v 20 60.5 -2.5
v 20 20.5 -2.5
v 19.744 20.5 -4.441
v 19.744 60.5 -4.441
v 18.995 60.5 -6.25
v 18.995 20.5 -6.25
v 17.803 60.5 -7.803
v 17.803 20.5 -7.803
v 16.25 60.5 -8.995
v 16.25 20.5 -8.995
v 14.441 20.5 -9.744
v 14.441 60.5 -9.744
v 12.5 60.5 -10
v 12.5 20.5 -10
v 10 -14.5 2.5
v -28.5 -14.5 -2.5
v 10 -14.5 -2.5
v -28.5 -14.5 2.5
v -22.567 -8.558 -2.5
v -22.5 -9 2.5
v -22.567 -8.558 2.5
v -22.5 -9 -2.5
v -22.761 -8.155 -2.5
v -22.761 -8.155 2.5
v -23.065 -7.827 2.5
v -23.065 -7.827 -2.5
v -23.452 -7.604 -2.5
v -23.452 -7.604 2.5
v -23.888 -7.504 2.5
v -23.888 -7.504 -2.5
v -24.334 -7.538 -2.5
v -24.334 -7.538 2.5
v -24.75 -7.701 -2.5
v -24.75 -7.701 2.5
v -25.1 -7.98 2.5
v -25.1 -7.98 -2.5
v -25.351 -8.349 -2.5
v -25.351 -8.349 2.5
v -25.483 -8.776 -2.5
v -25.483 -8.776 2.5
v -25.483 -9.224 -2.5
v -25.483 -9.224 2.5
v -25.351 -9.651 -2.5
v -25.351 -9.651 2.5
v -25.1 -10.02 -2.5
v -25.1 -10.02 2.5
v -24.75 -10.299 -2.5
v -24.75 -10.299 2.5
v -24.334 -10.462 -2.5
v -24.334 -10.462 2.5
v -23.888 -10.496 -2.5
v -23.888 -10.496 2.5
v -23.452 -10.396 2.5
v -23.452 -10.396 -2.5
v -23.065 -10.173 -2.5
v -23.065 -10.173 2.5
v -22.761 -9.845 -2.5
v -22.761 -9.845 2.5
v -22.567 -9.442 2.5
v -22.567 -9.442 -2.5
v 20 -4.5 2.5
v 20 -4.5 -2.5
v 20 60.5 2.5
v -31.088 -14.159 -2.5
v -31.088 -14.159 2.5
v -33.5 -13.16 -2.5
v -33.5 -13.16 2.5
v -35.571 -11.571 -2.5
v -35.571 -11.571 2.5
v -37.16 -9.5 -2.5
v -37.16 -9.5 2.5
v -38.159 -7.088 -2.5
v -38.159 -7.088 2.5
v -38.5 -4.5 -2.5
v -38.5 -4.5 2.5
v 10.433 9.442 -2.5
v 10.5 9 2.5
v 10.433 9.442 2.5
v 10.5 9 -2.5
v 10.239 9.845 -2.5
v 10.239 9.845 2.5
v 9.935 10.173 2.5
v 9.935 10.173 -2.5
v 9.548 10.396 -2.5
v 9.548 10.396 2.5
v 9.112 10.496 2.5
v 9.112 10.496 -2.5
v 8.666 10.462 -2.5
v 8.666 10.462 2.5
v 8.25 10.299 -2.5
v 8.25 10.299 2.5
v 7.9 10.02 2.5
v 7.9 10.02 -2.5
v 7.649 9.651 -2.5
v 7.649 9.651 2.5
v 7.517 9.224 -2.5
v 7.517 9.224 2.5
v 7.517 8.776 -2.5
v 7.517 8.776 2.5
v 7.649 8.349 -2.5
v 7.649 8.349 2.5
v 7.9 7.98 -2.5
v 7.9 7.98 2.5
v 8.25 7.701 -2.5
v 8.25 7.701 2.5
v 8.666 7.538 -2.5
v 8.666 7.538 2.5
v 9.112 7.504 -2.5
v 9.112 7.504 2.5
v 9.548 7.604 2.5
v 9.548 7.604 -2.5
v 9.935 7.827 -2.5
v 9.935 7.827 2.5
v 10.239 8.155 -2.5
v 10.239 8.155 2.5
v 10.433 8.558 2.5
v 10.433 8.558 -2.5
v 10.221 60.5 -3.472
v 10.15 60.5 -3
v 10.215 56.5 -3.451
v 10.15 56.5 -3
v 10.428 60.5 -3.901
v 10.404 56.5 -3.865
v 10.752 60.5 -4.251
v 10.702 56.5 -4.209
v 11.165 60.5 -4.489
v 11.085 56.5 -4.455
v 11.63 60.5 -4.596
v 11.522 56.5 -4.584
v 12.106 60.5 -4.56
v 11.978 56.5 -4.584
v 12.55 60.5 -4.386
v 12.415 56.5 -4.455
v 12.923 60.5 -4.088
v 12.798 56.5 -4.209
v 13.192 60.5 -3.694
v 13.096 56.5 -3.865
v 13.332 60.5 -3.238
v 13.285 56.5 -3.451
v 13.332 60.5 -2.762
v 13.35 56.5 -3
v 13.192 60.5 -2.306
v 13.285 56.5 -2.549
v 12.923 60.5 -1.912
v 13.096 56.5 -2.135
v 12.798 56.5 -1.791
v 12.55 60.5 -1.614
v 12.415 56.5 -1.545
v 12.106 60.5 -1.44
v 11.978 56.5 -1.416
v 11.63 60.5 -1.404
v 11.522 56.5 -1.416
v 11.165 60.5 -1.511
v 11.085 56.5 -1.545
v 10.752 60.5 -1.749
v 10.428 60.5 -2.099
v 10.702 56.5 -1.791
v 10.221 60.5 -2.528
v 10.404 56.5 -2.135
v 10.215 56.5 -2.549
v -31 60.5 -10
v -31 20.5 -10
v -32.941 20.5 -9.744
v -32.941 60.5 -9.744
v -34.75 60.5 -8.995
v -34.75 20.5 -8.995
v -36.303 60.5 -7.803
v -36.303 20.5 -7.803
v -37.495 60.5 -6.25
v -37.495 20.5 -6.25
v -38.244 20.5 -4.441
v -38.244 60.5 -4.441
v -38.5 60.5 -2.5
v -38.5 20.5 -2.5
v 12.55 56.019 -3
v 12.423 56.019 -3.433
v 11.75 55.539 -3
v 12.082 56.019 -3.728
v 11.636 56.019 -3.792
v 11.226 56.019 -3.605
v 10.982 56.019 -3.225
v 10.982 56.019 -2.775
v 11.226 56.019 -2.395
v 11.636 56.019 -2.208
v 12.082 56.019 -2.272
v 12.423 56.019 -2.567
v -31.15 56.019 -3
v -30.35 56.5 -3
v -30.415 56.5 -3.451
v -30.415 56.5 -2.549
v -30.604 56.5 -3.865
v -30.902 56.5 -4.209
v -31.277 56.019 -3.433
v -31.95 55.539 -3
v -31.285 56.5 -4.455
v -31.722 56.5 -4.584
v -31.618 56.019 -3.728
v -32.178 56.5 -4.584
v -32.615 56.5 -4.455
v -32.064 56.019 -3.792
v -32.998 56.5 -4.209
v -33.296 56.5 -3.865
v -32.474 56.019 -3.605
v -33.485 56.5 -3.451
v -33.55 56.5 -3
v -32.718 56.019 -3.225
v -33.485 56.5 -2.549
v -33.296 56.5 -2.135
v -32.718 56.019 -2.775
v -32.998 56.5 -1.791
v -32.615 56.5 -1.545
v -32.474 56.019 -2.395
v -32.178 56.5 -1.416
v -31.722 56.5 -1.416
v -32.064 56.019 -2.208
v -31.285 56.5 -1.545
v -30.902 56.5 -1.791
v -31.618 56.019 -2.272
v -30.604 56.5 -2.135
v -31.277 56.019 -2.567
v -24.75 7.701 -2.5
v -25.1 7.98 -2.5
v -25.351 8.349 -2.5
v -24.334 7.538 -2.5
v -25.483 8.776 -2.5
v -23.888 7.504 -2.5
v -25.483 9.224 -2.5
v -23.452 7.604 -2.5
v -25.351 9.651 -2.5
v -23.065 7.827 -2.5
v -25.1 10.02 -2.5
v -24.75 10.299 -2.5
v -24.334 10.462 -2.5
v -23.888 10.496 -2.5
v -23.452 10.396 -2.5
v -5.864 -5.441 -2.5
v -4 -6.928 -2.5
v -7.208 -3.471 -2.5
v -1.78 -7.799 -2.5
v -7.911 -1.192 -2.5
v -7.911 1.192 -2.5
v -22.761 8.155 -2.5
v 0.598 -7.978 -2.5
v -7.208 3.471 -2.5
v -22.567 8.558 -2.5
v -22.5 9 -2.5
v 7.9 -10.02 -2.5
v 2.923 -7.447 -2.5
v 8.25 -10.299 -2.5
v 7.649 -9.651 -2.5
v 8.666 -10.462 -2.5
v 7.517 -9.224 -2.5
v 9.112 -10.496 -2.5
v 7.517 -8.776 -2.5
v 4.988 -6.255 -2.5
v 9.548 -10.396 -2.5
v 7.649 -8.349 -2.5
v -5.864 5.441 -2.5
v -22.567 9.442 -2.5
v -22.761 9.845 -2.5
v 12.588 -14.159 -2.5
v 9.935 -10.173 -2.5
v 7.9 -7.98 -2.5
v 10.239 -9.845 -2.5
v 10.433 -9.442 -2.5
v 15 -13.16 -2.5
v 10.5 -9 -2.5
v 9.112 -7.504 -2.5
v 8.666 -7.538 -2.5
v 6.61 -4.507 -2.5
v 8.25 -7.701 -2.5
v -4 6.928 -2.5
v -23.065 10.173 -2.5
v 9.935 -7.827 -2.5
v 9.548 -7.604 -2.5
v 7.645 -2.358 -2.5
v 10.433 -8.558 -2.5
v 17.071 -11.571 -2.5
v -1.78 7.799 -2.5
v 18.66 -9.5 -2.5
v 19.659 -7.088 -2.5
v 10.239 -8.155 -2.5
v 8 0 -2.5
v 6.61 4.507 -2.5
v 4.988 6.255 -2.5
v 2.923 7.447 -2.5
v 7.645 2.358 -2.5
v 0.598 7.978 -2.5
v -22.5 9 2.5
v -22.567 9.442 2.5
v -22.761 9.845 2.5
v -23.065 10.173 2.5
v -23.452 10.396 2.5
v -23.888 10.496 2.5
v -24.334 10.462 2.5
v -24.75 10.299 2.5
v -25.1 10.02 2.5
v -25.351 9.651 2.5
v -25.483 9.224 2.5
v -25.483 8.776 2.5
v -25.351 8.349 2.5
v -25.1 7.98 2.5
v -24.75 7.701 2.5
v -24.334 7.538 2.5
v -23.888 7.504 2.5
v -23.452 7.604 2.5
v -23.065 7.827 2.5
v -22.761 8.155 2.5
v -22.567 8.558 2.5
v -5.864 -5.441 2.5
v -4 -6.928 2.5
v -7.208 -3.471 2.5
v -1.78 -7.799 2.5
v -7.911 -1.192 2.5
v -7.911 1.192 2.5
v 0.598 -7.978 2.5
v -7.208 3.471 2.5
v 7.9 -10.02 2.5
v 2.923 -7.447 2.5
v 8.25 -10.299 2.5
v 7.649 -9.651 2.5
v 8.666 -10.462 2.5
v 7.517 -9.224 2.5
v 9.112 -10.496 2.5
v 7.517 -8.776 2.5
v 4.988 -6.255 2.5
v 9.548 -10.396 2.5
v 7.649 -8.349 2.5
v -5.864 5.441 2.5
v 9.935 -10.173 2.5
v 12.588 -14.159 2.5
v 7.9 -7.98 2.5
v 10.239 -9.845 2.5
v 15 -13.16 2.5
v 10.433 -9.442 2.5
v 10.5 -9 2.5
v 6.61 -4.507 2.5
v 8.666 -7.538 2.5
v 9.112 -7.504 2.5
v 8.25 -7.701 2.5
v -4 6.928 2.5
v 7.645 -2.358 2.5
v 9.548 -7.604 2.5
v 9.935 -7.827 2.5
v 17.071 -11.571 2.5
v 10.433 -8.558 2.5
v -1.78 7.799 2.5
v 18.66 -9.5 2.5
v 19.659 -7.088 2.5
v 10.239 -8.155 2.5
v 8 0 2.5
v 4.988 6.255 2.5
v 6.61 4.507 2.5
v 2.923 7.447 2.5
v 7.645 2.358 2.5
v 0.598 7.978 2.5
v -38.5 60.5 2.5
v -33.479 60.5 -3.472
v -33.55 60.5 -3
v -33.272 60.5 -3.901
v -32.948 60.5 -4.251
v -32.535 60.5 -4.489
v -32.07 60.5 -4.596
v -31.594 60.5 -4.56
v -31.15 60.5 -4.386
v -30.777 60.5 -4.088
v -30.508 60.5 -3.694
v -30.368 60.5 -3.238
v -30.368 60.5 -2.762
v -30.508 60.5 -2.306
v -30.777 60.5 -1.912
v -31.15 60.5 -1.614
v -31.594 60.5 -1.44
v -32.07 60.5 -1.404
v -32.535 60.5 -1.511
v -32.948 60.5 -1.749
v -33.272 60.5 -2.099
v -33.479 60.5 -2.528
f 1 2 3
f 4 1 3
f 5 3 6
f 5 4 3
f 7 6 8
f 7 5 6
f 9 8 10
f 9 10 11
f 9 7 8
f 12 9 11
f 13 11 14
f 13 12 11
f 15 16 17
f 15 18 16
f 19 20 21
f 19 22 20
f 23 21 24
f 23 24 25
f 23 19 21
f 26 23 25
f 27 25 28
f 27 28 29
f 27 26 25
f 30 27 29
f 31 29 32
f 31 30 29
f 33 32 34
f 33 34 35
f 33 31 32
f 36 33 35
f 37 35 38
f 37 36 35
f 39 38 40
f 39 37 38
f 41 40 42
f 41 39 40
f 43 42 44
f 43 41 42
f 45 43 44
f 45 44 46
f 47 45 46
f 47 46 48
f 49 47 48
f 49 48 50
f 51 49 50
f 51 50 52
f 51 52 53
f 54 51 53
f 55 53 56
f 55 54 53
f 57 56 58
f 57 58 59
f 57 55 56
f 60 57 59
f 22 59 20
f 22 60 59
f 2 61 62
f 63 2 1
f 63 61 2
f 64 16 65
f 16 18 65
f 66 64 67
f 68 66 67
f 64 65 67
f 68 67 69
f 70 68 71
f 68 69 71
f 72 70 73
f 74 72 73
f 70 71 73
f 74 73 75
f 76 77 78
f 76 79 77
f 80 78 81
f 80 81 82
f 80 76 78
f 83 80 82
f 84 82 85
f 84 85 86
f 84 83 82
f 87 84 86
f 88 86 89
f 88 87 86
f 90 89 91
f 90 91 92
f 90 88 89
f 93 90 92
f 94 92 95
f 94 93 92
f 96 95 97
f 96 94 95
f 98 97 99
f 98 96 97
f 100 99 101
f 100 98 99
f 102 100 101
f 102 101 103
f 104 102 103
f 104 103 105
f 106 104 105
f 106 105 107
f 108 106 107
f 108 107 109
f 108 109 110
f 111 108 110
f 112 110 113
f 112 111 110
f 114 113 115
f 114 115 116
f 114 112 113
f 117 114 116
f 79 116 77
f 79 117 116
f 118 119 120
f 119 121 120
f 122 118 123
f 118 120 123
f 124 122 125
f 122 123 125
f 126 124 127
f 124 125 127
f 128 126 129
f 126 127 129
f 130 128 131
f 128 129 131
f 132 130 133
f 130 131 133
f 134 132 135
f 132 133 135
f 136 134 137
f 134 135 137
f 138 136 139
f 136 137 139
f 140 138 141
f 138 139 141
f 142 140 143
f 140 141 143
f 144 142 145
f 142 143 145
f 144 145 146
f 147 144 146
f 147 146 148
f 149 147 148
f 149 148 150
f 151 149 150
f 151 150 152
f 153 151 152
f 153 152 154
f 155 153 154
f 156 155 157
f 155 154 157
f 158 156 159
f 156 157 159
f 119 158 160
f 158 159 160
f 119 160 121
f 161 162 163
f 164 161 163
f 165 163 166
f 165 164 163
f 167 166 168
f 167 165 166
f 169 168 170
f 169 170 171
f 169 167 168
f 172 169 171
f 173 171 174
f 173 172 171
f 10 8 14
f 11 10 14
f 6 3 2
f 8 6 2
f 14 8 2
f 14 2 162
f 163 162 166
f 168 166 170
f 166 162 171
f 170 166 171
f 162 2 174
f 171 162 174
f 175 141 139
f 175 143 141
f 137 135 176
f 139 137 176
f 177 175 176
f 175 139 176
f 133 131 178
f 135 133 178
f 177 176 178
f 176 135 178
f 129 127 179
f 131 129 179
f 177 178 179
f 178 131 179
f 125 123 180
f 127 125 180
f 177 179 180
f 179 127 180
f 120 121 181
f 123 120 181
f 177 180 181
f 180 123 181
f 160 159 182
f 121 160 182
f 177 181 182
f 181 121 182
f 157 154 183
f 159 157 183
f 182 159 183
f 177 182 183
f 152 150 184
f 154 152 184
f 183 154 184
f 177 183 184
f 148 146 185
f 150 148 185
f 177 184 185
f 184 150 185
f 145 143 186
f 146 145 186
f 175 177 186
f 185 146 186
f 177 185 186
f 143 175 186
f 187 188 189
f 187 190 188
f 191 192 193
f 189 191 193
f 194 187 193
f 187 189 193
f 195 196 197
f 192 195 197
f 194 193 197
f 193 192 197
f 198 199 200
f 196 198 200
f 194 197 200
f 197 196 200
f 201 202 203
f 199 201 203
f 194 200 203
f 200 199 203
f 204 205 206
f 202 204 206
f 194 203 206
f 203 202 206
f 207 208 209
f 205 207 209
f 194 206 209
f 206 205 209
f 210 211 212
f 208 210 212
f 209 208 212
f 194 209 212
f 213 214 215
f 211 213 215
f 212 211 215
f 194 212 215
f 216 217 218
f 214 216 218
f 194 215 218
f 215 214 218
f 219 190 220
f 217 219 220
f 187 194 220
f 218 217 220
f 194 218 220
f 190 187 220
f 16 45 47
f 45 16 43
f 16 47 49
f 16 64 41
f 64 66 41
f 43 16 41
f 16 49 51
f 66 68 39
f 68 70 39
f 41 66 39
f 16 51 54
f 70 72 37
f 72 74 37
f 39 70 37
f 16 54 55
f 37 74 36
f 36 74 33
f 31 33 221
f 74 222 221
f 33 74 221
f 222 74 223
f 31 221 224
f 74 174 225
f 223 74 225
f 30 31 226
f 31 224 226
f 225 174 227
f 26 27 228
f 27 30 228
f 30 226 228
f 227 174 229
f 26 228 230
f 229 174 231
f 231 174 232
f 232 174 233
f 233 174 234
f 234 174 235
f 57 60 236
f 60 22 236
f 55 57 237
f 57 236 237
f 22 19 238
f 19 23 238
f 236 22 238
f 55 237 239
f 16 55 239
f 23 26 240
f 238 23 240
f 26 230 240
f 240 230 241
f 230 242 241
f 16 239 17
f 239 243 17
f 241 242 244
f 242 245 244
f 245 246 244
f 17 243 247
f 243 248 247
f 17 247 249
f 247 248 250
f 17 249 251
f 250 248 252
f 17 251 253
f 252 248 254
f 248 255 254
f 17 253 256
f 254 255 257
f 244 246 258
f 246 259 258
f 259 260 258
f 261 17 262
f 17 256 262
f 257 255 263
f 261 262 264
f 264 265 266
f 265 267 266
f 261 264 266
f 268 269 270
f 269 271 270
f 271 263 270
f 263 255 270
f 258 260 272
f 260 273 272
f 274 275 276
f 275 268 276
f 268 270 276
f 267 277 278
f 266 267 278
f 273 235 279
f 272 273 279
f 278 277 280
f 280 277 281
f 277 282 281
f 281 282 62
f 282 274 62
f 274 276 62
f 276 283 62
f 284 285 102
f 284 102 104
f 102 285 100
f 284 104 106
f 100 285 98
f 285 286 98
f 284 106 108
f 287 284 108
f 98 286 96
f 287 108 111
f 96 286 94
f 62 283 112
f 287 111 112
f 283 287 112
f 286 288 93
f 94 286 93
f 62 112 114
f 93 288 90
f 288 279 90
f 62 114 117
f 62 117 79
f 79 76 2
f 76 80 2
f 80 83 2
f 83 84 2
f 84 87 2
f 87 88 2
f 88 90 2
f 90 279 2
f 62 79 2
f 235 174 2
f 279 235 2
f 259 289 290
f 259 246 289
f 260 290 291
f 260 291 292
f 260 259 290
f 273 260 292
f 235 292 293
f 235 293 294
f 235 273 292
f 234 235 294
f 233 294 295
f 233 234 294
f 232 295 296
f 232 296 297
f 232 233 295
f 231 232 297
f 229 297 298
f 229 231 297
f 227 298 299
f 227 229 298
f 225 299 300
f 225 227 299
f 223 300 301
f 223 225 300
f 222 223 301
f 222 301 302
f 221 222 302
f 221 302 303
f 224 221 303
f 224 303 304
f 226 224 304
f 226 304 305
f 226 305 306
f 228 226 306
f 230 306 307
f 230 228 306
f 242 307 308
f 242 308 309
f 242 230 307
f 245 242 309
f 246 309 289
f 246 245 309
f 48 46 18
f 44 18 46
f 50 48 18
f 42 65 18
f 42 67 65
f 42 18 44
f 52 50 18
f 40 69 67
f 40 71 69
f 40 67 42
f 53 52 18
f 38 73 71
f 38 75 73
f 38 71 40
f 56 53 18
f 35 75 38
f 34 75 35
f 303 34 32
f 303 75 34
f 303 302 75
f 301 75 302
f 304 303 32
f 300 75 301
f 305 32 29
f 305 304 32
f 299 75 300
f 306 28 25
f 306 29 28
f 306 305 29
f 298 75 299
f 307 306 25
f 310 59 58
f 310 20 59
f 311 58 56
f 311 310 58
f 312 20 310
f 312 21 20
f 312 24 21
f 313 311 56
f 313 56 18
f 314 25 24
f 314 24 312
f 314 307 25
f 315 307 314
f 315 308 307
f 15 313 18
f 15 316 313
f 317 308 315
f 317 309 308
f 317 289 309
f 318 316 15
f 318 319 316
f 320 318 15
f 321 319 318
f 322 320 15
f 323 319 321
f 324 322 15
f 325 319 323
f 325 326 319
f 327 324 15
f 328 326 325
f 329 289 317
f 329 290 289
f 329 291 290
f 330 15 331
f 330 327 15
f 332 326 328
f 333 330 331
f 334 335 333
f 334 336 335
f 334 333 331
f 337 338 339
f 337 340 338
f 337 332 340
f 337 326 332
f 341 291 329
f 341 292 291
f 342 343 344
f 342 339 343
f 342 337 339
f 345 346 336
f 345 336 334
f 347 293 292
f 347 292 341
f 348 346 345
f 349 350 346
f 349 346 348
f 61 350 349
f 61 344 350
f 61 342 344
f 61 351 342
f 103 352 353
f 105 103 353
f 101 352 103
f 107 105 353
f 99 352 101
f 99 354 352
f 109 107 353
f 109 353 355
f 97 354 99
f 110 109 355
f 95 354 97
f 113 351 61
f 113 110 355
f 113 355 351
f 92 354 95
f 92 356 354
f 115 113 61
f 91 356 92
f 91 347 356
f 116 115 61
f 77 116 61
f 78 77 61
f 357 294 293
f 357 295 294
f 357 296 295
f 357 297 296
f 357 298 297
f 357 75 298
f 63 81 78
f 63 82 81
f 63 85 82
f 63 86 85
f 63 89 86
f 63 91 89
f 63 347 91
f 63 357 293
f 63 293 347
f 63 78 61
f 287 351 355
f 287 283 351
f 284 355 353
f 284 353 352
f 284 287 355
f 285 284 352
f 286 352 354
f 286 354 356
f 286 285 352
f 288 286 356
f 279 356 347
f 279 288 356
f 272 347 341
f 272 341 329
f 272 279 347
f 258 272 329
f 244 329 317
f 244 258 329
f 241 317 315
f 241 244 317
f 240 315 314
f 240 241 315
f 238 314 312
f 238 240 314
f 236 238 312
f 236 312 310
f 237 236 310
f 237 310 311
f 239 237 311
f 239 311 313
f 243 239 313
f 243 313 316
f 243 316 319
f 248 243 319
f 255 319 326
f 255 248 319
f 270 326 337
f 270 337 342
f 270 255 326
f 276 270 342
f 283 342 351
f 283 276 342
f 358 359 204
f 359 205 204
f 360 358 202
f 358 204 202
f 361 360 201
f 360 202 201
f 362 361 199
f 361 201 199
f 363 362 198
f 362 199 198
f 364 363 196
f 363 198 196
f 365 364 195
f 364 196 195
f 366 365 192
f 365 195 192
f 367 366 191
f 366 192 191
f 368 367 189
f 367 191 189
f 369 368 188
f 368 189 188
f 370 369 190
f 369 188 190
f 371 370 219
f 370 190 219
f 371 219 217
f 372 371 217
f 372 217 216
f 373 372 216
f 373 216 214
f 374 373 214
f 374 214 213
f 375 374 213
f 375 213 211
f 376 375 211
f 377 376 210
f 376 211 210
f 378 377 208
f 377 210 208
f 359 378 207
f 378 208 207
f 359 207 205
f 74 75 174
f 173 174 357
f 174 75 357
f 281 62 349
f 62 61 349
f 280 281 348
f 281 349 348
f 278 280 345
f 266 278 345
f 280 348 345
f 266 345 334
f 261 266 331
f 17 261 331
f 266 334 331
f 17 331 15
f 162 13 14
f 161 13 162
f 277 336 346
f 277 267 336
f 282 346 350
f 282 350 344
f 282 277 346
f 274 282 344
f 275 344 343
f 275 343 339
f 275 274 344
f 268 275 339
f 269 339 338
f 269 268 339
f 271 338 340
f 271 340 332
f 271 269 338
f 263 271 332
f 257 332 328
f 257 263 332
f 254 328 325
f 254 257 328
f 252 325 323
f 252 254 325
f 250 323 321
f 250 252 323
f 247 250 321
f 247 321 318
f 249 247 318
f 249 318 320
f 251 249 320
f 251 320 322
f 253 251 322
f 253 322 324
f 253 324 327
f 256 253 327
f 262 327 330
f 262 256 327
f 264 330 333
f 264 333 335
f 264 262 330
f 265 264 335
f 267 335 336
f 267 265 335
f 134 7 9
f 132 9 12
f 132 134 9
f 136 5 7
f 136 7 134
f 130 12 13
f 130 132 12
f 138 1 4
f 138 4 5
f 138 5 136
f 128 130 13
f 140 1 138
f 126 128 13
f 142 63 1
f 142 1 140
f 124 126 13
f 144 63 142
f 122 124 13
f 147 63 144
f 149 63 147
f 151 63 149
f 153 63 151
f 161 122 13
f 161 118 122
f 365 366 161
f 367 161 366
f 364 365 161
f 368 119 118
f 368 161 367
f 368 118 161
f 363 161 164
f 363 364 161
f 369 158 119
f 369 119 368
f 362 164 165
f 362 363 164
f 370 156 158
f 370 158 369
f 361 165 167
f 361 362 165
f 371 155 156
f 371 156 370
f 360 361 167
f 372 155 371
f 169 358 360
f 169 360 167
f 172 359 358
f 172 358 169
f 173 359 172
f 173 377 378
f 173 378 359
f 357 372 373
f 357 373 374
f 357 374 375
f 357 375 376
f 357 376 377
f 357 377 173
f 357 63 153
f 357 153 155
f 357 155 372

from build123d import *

# Parameters (mm, degrees)
SKETCH1_W                = 58.5
SKETCH1_H                = 75
SKETCH1_R                = 8
SKETCH1_R_2              = 1.5
BOSS_EXTRUDE1_DEPTH      = 2.5
SKETCH4_W                = 58.5
SKETCH4_H                = 40
BOSS_EXTRUDE2_DEPTH      = 7.5
M3_CLEARANCE_HOLE1_D     = 3.2
M3_CLEARANCE_HOLE1_DEPTH = 4
M3_CLEARANCE_HOLE1_TIP   = 0.96137699
FILLET1_R                = 10
FILLET2_R                = 7.5


with BuildPart() as part:
    # Sketch1 → Boss-Extrude1 (new, symmetric)
    with BuildSketch(Plane.XY):
        with Locations((-9.25, 23)):
            Rectangle(SKETCH1_W, SKETCH1_H)
        Circle(SKETCH1_R, mode=Mode.SUBTRACT)
        with Locations((-24, -9)):
            Circle(SKETCH1_R_2, mode=Mode.SUBTRACT)
        with Locations((9, -9)):
            Circle(SKETCH1_R_2, mode=Mode.SUBTRACT)
        with Locations((9, 9)):
            Circle(SKETCH1_R_2, mode=Mode.SUBTRACT)
        with Locations((-24, 9)):
            Circle(SKETCH1_R_2, mode=Mode.SUBTRACT)
    extrude(amount=BOSS_EXTRUDE1_DEPTH, both=True)

    # Sketch4 → Boss-Extrude2 (add)
    with BuildSketch(Plane(origin=(0, 0, -2.5), x_dir=(-1, 0, 0), z_dir=(0, 0, -1))):
        with Locations((9.25, 40.5)):
            Rectangle(SKETCH4_W, SKETCH4_H)
    extrude(amount=BOSS_EXTRUDE2_DEPTH)

    # M3 Clearance Hole1
    with Locations(Plane(origin=(0, 60.5, 0), x_dir=(1, 0, 0), z_dir=(0, 1, 0))):
        with Locations((-31.95, 3), (11.75, 3)):
            Hole(M3_CLEARANCE_HOLE1_D / 2, depth=M3_CLEARANCE_HOLE1_DEPTH)
            with Locations((0, 0, -(M3_CLEARANCE_HOLE1_DEPTH + M3_CLEARANCE_HOLE1_TIP / 2))):  # 118° drill point
                Cone(0, M3_CLEARANCE_HOLE1_D / 2, M3_CLEARANCE_HOLE1_TIP, mode=Mode.SUBTRACT)

    # Fillet1
    fillet1_edges = [part.edges().sort_by_distance(p)[0] for p in [
        (20, -14.5, 0),
        (-38.5, -14.5, 0),
    ]]
    fillet(fillet1_edges, radius=FILLET1_R)

    # Fillet2
    fillet2_edges = [part.edges().sort_by_distance(p)[0] for p in [
        (-38.5, 40.5, -10),
        (20, 40.5, -10),
    ]]
    fillet(fillet2_edges, radius=FILLET2_R)


solid = part.part
